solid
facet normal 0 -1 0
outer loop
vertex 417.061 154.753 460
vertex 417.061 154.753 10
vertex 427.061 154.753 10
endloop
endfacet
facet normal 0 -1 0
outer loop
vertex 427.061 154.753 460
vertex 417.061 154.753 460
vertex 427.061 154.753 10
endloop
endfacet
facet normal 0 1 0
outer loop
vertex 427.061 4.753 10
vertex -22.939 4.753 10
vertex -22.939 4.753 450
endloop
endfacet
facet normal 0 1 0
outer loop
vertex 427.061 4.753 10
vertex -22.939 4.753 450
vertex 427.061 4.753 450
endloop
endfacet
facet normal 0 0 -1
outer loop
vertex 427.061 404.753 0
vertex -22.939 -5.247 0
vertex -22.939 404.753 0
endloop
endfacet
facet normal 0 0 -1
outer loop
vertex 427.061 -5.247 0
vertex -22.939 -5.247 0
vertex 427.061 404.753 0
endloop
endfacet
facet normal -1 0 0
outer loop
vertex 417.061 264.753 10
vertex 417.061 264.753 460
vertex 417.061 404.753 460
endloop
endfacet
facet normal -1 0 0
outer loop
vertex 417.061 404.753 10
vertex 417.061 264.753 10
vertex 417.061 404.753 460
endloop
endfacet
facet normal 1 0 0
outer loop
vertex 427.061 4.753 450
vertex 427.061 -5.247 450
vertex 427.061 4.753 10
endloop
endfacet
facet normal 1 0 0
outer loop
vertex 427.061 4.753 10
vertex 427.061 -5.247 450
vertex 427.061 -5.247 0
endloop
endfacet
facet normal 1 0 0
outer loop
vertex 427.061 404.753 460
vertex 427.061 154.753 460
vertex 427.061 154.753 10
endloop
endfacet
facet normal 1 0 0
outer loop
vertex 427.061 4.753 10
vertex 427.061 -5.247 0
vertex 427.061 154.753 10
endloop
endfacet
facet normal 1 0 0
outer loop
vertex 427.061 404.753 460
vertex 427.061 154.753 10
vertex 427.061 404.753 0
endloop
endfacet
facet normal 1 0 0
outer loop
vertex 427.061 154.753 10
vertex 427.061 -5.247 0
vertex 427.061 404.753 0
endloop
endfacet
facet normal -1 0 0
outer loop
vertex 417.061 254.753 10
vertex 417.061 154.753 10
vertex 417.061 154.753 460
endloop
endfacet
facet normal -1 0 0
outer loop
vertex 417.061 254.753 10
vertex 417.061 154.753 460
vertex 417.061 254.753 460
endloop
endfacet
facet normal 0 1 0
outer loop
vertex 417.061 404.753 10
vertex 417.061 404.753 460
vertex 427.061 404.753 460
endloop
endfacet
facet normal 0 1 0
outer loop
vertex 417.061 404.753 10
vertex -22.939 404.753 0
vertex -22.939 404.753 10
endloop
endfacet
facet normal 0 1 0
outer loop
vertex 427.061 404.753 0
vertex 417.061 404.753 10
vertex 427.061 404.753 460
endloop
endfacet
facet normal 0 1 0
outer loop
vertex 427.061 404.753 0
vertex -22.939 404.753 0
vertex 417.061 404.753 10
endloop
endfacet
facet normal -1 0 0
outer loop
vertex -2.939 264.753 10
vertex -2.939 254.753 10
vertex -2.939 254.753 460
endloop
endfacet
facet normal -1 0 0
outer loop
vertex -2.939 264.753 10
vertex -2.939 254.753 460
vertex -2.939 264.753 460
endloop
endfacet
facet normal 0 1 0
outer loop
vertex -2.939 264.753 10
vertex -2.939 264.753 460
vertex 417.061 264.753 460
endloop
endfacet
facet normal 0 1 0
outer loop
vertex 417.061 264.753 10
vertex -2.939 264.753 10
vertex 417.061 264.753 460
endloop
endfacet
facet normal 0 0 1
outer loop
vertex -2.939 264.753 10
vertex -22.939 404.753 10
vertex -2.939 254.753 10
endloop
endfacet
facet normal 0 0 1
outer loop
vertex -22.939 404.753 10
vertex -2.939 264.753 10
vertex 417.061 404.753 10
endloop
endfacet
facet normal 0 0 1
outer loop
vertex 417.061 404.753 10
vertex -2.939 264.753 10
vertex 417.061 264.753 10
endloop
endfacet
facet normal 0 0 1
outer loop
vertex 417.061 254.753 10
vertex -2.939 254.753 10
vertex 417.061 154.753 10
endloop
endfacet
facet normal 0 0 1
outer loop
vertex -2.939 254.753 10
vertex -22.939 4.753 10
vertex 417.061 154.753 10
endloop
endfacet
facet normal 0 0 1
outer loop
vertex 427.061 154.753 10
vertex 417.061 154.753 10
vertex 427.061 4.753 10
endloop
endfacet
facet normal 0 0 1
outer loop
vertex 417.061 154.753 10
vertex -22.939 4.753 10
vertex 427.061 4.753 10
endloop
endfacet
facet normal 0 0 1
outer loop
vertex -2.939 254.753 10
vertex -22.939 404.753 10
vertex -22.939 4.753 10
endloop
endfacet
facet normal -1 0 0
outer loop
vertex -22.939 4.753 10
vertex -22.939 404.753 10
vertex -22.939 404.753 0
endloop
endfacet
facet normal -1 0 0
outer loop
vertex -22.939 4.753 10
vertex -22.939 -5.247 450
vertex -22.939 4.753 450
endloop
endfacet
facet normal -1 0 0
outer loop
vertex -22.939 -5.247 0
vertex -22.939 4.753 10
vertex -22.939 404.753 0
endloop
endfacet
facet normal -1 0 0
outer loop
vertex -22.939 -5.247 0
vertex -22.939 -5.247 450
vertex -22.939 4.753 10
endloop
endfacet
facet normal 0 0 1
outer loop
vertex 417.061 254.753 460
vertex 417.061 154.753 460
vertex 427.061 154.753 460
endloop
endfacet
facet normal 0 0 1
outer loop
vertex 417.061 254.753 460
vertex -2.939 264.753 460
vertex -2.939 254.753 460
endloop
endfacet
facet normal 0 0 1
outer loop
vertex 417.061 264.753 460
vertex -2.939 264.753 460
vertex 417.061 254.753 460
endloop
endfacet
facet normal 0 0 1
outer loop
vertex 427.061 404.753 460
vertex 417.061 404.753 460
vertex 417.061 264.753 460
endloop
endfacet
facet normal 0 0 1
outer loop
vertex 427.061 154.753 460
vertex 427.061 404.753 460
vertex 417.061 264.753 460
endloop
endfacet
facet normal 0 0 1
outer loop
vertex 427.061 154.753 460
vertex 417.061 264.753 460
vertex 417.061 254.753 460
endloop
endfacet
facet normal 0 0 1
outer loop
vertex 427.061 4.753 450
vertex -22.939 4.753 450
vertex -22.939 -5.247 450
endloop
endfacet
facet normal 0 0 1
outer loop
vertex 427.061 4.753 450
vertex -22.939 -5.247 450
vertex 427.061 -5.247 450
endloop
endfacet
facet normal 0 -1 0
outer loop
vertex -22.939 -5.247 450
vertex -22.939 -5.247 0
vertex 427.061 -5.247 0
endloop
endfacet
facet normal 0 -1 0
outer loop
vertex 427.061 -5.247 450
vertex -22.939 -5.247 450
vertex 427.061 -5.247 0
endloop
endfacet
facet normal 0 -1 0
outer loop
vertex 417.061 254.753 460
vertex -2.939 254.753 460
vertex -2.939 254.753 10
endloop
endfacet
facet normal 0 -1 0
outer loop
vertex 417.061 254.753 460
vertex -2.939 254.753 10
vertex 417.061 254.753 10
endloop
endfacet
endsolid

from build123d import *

# Parameters (mm, degrees)
SKETCH1_W           = 450
SKETCH1_H           = 10
BOSS_EXTRUDE1_DEPTH = 450
SKETCH2_W           = 450
SKETCH2_H           = 10
BOSS_EXTRUDE2_DEPTH = 400
SKETCH3_W           = 10
SKETCH3_H           = 250
BOSS_EXTRUDE3_DEPTH = 450
SKETCH4_W           = 420
SKETCH4_H           = 10
BOSS_EXTRUDE4_DEPTH = 450


with BuildPart() as part:
    # Sketch1 → Boss-Extrude1 (new body)
    with BuildSketch(Plane.XY):
        with Locations((202.060737527, -0.246746204)):
            Rectangle(SKETCH1_W, SKETCH1_H)
    extrude(amount=BOSS_EXTRUDE1_DEPTH)

    # Sketch2 → Boss-Extrude2 (add)
    with BuildSketch(Plane(origin=(0, 4.753253796, 0), x_dir=(1, 0, 0), z_dir=(0, 1, 0))):
        with Locations((202.060737527, -5)):
            Rectangle(SKETCH2_W, SKETCH2_H)
    extrude(amount=BOSS_EXTRUDE2_DEPTH)

    # Sketch3 → Boss-Extrude3 (add)
    with BuildSketch(Plane.XY.offset(10)):
        with Locations((422.060737527, 279.753253796)):
            Rectangle(SKETCH3_W, SKETCH3_H)
    extrude(amount=BOSS_EXTRUDE3_DEPTH)

    # Sketch4 → Boss-Extrude4 (add)
    with BuildSketch(Plane.XY.offset(10)):
        with Locations((207.060737527, 259.753253796)):
            Rectangle(SKETCH4_W, SKETCH4_H)
    extrude(amount=BOSS_EXTRUDE4_DEPTH)


solid = part.part
